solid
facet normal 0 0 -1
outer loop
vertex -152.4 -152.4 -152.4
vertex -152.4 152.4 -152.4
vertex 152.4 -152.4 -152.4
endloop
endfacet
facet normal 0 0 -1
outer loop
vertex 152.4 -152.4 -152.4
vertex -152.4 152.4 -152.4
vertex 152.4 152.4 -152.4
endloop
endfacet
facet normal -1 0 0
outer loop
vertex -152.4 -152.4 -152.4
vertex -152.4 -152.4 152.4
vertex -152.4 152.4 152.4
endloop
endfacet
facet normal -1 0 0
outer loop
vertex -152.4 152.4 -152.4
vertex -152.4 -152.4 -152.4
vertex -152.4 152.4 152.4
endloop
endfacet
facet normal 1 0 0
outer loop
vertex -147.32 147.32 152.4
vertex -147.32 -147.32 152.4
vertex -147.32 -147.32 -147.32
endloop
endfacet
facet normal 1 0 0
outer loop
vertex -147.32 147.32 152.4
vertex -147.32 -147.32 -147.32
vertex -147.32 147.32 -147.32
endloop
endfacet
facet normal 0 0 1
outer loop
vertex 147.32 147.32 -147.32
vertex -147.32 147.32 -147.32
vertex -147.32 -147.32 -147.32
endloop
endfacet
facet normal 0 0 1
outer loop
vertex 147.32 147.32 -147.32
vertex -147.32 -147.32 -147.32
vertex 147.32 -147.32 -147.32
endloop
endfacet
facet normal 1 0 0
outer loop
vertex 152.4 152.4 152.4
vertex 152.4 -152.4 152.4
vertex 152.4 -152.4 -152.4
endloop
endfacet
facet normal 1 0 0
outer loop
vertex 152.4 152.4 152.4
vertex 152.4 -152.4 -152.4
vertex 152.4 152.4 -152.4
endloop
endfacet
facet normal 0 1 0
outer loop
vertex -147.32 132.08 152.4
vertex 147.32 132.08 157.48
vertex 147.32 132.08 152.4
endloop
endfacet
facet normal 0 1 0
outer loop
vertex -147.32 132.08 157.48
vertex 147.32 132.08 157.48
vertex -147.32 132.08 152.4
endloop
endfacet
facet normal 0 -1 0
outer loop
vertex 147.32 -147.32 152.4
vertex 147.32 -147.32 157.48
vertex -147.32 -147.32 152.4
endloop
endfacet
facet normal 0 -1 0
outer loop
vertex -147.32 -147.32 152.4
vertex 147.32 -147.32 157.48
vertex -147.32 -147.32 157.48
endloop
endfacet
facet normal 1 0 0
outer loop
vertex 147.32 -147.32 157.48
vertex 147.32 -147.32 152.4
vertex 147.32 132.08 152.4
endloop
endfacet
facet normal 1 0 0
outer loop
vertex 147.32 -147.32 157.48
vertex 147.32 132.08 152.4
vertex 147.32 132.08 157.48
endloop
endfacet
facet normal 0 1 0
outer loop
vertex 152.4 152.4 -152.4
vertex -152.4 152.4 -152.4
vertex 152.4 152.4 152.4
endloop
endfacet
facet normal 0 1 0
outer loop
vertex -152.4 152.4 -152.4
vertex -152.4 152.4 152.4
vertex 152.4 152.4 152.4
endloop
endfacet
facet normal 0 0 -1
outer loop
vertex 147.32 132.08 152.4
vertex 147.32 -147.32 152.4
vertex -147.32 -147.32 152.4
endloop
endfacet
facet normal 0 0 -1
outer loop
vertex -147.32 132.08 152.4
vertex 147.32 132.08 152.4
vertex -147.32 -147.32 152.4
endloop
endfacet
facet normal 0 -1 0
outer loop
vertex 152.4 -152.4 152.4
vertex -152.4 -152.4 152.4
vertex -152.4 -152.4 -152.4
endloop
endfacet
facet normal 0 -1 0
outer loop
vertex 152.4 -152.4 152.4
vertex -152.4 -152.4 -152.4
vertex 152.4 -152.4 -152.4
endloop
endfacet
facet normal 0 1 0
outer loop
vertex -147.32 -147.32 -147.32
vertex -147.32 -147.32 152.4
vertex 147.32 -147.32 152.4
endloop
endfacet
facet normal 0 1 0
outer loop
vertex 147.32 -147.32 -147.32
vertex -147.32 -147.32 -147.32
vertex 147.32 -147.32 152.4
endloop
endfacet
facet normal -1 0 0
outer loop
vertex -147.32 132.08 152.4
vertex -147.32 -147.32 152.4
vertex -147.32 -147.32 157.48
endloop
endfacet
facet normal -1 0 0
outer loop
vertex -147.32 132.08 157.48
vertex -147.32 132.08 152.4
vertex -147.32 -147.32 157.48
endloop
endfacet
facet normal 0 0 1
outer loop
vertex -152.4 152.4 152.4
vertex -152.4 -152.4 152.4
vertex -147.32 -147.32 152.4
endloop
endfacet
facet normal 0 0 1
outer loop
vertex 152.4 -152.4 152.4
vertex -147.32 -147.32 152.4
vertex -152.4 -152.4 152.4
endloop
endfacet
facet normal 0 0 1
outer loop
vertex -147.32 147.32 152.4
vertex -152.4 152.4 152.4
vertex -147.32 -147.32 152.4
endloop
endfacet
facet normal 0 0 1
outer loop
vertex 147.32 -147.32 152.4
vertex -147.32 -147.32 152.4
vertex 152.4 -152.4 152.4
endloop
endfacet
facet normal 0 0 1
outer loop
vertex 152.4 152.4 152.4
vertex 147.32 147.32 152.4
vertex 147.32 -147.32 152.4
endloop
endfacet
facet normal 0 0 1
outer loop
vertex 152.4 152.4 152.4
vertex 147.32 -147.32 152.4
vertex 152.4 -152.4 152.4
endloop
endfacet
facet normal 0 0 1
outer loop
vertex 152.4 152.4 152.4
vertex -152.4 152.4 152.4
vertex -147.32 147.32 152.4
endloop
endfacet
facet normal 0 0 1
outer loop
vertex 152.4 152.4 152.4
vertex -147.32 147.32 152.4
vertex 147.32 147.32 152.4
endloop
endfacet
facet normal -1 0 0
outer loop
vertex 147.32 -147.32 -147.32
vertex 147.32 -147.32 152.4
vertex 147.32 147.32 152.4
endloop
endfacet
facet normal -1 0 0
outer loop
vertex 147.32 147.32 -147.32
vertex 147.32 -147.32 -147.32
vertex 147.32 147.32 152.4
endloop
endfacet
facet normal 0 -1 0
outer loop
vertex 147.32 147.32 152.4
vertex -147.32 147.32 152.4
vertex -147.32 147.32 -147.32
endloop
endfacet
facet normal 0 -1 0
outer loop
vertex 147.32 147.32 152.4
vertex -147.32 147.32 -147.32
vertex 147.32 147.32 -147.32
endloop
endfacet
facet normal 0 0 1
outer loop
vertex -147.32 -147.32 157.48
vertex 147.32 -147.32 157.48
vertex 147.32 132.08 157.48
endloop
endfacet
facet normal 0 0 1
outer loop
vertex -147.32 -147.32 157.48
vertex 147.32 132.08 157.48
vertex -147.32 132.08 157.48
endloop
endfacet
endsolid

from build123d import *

# Parameters (mm, degrees)
F0_W     = 304.8
F0_H     = 304.8
F1_DEPTH = 152.4
F2_T     = -5.08
F3_W     = 294.64
F3_H     = 5.08
F4_DEPTH = 279.4


with BuildPart() as f1:
    # F0 (on Top) → F1 (new body, symmetric)
    with BuildSketch(Plane.XY):
        Rectangle(F0_W, F0_H)
    extrude(amount=F1_DEPTH, both=True)

    # F2
    f2_openings = [f1.faces().sort_by_distance(p)[0] for p in [
        (0, 0, 152.4),
    ]]
    offset(amount=F2_T, openings=f2_openings)


with BuildPart() as f4:
    # F3 (on face) → F4 (new body)
    with BuildSketch(Plane(origin=(0, -147.32, 0), x_dir=(-1, 0, 0), z_dir=(0, 1, 0))):
        with Locations((0, 154.94)):
            Rectangle(F3_W, F3_H)
    extrude(amount=F4_DEPTH)


solid = Compound([f1.part, f4.part])
